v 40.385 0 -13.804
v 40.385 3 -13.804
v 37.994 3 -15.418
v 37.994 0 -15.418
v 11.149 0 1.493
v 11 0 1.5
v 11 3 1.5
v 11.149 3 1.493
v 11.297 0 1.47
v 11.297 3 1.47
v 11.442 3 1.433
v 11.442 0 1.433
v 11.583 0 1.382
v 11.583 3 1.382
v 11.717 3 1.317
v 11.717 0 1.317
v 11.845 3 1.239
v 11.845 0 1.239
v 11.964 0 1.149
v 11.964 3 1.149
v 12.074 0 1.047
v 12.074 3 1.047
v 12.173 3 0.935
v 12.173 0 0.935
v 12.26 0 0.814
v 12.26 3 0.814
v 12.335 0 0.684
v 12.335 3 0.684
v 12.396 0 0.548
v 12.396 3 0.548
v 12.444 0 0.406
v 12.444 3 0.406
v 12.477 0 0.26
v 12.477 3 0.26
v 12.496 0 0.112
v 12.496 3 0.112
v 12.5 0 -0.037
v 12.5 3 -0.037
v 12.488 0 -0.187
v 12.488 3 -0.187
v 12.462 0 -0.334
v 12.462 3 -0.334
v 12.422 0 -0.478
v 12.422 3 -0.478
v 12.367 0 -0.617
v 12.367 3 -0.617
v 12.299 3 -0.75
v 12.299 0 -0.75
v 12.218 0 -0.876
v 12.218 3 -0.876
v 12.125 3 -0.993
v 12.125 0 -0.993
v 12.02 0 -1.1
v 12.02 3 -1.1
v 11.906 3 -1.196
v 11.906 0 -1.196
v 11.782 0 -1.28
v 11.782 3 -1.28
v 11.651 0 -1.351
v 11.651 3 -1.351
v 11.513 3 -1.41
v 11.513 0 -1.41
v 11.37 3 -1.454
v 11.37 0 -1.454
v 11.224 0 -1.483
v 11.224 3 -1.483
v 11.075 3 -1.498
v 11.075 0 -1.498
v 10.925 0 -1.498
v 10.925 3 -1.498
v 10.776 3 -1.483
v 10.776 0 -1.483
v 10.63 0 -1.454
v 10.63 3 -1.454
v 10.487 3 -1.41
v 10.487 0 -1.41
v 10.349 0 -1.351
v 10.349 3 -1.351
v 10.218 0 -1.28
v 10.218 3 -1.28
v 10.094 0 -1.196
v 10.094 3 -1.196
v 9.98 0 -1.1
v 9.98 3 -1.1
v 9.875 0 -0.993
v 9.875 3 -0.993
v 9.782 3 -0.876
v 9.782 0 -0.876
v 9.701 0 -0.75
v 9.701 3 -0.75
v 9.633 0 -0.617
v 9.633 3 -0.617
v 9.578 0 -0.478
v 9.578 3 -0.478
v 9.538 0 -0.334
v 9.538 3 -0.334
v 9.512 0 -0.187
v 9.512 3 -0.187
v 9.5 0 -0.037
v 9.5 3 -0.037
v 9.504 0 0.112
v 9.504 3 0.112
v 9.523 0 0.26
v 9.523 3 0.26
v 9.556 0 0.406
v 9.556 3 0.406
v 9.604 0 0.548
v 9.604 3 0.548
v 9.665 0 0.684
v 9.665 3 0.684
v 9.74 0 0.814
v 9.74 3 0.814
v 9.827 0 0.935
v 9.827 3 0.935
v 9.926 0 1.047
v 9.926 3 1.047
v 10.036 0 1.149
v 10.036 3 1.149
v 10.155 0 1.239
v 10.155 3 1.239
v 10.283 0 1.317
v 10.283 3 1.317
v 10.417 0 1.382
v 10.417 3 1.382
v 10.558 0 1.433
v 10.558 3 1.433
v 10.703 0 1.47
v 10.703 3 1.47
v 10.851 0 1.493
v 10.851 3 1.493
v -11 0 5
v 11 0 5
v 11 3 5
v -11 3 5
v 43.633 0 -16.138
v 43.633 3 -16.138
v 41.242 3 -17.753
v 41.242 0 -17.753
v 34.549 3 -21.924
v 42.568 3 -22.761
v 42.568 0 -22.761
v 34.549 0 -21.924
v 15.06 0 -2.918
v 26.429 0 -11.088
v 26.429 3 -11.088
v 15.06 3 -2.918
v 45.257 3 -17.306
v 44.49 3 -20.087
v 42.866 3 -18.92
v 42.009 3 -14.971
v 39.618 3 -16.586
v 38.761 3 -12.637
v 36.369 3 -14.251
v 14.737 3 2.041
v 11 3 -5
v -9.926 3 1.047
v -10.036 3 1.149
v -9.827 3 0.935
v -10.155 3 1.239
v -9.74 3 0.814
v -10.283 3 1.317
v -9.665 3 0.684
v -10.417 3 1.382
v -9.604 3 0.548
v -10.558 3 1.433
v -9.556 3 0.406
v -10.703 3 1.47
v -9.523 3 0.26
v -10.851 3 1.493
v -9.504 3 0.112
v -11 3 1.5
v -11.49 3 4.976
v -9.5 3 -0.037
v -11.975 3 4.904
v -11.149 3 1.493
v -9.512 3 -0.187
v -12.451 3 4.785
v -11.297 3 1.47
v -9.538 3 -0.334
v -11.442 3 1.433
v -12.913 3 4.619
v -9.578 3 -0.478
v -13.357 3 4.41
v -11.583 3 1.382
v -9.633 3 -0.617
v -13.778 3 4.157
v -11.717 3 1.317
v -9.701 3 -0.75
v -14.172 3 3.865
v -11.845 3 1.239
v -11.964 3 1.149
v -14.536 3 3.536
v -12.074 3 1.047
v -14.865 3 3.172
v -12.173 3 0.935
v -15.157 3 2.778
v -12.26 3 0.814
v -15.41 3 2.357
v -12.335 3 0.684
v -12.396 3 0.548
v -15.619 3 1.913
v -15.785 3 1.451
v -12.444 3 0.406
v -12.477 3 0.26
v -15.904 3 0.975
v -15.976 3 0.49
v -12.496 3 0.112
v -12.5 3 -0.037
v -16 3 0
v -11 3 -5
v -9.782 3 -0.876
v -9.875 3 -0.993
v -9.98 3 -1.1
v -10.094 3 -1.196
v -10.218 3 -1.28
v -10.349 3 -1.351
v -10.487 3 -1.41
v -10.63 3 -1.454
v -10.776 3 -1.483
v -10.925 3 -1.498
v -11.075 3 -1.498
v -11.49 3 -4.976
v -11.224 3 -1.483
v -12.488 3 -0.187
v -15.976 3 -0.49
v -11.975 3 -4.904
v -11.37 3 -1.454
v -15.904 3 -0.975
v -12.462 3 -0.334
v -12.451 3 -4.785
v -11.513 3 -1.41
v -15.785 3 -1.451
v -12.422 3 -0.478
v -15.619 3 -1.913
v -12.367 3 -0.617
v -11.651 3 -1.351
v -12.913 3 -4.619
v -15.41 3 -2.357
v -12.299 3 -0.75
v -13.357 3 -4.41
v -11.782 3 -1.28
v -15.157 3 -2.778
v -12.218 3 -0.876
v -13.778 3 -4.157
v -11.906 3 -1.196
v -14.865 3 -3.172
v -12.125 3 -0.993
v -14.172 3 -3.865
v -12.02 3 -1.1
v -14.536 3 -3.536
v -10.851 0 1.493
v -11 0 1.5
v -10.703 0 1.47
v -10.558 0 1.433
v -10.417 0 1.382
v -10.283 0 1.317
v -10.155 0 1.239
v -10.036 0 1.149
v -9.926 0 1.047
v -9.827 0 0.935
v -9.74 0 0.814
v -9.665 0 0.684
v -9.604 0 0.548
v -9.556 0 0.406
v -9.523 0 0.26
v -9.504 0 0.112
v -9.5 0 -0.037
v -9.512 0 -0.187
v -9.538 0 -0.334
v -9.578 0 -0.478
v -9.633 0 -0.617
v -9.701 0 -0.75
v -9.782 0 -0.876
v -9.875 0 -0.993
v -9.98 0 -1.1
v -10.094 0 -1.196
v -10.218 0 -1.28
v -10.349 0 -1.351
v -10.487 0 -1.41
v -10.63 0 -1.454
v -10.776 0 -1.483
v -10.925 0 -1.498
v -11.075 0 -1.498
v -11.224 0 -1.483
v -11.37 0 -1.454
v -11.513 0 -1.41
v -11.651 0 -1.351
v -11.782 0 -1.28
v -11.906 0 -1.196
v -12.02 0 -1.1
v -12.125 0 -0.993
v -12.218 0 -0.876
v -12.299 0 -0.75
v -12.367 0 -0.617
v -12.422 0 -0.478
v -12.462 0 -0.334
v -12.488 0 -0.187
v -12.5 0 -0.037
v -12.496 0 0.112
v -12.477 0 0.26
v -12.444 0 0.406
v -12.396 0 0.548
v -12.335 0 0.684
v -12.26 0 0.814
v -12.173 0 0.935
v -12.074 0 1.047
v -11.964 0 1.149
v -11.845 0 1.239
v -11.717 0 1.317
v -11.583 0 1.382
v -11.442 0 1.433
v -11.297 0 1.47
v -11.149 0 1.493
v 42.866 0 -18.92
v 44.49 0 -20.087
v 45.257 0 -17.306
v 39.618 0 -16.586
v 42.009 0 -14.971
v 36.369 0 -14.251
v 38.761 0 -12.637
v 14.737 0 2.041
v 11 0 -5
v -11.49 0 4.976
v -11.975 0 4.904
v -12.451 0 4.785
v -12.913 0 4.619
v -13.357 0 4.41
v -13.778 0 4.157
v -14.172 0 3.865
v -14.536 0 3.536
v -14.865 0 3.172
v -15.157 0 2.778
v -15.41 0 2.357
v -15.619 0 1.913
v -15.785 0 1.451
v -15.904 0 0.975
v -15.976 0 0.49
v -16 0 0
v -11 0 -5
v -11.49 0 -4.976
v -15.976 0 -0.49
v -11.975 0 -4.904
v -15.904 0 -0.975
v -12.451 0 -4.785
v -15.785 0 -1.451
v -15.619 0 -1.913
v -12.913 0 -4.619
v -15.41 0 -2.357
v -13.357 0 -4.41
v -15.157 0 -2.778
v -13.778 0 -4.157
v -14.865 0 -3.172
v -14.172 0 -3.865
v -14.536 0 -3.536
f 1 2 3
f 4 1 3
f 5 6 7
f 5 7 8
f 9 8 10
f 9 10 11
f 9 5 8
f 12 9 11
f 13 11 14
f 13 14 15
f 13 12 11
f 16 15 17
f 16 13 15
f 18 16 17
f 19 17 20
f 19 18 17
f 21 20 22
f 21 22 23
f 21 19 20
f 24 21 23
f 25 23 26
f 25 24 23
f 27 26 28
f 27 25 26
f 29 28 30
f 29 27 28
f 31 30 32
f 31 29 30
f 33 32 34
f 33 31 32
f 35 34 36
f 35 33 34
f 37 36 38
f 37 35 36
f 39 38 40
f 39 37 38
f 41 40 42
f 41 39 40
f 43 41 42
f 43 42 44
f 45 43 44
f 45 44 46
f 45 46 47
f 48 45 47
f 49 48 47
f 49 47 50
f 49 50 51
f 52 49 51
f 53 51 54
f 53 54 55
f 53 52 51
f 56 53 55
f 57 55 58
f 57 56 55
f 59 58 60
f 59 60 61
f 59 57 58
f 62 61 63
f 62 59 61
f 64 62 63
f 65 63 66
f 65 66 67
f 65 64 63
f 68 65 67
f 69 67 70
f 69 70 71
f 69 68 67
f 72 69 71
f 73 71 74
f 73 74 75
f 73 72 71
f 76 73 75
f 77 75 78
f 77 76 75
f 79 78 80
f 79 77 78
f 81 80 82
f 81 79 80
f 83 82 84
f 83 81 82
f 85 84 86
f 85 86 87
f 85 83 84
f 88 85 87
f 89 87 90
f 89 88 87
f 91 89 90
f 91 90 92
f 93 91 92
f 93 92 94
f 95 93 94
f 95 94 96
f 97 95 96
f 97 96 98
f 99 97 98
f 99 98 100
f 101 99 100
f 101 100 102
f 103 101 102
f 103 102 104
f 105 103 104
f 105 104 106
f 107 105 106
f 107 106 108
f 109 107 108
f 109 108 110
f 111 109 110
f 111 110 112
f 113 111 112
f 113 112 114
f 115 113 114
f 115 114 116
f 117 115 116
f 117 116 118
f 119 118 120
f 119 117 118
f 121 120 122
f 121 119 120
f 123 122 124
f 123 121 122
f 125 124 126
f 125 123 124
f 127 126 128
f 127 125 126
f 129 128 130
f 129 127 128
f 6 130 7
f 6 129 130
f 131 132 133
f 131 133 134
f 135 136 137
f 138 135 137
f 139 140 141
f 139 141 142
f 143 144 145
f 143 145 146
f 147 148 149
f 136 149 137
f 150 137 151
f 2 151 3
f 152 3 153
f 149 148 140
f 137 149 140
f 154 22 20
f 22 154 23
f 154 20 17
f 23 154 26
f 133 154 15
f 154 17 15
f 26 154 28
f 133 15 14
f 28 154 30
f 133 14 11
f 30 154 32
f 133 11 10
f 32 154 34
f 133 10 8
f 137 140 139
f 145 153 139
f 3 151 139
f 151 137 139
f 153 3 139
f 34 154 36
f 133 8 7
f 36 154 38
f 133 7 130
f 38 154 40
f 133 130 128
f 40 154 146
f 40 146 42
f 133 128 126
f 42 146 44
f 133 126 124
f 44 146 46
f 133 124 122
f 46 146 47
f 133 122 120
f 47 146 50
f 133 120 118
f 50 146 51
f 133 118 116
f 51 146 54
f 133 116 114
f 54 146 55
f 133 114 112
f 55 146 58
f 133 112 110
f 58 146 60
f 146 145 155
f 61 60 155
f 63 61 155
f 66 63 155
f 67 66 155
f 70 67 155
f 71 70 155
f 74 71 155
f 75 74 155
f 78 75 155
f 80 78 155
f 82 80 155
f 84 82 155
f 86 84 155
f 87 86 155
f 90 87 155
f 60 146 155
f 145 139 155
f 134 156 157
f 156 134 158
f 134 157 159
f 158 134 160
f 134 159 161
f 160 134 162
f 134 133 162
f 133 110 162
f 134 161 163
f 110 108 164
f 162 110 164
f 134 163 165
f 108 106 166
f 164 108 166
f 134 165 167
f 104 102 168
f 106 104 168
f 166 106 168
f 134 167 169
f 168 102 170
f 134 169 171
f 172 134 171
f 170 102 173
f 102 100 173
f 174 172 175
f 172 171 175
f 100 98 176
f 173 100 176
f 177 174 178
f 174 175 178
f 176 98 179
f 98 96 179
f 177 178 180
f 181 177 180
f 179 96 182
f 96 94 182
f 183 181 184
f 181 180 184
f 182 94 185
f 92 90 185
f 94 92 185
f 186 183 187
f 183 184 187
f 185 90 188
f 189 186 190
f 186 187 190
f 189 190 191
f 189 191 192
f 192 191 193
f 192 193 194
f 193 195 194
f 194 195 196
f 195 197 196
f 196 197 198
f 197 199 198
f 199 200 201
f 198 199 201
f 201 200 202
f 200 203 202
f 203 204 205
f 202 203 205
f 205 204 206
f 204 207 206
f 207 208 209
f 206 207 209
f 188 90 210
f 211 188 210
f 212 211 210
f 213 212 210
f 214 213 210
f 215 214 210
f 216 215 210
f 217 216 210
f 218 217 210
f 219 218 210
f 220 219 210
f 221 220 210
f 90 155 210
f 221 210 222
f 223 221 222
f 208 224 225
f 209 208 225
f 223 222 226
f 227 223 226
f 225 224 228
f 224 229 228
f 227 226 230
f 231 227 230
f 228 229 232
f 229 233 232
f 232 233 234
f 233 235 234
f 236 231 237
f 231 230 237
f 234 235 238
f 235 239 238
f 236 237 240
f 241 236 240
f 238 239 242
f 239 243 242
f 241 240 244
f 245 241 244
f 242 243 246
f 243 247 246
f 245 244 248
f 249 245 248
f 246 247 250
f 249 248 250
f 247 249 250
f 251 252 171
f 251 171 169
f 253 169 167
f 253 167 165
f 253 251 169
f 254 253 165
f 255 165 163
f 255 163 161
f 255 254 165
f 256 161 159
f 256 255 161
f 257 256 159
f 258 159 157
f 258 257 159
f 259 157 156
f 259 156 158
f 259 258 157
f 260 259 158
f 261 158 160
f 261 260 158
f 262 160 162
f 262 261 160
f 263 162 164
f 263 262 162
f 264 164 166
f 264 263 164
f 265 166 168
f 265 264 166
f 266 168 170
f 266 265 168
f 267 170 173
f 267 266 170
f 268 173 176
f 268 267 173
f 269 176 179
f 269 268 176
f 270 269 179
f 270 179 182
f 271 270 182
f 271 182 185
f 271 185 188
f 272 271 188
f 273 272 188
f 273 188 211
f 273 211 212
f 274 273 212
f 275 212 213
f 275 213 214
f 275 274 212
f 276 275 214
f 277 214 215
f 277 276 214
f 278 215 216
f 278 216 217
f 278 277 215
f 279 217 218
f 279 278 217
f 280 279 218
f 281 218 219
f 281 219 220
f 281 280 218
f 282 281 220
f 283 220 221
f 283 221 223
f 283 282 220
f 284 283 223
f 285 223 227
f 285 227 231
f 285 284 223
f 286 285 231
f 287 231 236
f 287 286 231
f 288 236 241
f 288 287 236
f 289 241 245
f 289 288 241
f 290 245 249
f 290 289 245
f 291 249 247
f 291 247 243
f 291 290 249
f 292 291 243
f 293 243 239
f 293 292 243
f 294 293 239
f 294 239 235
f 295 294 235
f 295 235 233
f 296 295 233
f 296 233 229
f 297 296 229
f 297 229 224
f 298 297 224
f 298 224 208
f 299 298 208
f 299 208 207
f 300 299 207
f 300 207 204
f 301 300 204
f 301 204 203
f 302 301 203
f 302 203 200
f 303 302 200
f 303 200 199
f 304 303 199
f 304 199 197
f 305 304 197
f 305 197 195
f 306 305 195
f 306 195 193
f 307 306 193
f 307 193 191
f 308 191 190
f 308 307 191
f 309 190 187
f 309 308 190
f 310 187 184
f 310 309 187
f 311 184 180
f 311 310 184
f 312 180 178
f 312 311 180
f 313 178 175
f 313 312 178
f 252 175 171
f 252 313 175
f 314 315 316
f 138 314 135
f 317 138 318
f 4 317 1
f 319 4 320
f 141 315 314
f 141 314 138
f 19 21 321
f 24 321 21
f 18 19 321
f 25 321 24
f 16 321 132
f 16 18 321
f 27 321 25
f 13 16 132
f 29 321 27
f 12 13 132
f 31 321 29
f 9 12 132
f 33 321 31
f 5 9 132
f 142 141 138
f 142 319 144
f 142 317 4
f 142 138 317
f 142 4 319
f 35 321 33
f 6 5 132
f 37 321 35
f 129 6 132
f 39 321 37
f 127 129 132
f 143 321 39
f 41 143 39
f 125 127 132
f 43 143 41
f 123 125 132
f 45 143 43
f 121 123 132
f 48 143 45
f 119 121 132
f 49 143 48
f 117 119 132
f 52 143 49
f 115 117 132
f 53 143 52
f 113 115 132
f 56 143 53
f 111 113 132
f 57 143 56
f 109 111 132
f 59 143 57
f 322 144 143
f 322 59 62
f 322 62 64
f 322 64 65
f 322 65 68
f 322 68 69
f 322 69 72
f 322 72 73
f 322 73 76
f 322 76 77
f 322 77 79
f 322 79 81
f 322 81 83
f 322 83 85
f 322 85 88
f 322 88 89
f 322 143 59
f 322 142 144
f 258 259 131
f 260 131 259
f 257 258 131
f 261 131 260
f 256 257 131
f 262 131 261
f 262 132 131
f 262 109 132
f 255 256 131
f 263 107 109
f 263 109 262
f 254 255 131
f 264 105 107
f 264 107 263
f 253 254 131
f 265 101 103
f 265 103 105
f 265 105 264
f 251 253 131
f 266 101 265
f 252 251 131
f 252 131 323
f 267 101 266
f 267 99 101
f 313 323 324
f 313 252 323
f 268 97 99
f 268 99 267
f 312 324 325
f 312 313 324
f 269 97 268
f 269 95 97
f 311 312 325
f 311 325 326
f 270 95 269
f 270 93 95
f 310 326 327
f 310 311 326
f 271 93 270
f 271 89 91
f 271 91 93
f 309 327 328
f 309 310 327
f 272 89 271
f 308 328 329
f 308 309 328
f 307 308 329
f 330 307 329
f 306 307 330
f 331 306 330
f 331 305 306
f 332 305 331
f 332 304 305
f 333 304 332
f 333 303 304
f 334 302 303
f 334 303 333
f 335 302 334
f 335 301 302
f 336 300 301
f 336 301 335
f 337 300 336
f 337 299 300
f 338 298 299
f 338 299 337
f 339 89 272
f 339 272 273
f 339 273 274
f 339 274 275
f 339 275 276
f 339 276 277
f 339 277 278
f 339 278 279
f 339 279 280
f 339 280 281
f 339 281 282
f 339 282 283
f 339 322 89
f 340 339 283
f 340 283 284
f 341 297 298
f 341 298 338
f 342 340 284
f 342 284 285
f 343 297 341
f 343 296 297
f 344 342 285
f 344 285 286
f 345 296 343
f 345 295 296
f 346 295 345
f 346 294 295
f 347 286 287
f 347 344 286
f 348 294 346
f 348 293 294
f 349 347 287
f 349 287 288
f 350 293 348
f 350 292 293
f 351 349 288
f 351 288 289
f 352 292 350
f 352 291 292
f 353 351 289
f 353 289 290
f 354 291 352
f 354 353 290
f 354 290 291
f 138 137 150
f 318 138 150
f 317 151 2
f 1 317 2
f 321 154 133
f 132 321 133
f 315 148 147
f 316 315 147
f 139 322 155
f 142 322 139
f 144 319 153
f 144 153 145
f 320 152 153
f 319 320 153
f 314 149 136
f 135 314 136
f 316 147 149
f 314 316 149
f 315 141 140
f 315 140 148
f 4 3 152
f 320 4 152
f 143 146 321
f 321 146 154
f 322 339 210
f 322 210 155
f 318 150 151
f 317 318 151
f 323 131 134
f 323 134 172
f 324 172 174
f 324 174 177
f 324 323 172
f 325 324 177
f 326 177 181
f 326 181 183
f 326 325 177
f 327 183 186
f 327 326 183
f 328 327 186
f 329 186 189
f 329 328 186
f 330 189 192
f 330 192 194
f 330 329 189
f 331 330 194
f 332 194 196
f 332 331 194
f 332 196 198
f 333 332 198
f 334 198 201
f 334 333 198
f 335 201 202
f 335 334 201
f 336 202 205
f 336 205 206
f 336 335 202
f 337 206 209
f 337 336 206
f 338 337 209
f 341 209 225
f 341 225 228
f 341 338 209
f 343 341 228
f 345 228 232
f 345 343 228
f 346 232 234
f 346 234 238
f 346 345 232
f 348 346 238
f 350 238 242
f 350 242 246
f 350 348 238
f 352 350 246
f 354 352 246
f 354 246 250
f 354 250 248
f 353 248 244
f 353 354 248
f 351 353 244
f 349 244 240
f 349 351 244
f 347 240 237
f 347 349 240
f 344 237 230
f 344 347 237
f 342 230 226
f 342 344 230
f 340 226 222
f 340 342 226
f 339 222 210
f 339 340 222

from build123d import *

# Parameters (mm, degrees)
IZIM2_R                     = 1.5
Y_KSEKLIK_EKSTR_ZYON1_DEPTH = 3
Y_KSEKLIK_EKSTR_ZYON2_START = -3
Y_KSEKLIK_EKSTR_ZYON2_DEPTH = 3
KES_EKSTR_ZYON1_DEPTH       = 3
KES_EKSTR_ZYON2_DEPTH       = 3
KES_EKSTR_ZYON3_DEPTH       = 3


with BuildPart() as part:
    # Çizim2 → Yükseklik-Ekstrüzyon1 (new body)
    with BuildSketch(Plane(origin=(0, 0, 0), x_dir=(1, 0, 0), z_dir=(0, 1, 0))):
        with BuildLine():
            Line((-11, 5), (11, 5))
            ThreePointArc((11, 5), (16, 0), (11, -5))
            Line((11, -5), (-11, -5))
            ThreePointArc((-11, -5), (-16, 0), (-11, 5))
        make_face()
        with Locations(Location((-11, 0, 0), (0, 0, 270))):
            Circle(IZIM2_R, mode=Mode.SUBTRACT)
        with Locations(Location((11, 0, 0), (0, 0, 270))):
            Circle(IZIM2_R, mode=Mode.SUBTRACT)
    extrude(amount=Y_KSEKLIK_EKSTR_ZYON1_DEPTH)

    # Çizim3 → Yükseklik-Ekstrüzyon2 (add)
    with BuildSketch(Plane(origin=(0, 3, 0), x_dir=(1, 0, 0), z_dir=(0, 1, 0)).offset(Y_KSEKLIK_EKSTR_ZYON2_START)):
        with BuildLine():
            Line((11, 5), (40.233453571, 26.009645221))
            Line((40.233453571, 26.009645221), (46.069466132, 17.889241451))
            Line((46.069466132, 17.889241451), (37.949062363, 12.05322889))
            Line((37.949062363, 12.05322889), (36.369445688, 14.251155139))
            Line((36.369445688, 14.251155139), (26.428767162, 11.088423867))
            Line((26.428767162, 11.088423867), (15.060201885, 2.918006281))
            ThreePointArc((15.060201885, 2.918006281), (13.281443468, 4.449158988), (11, 5))
        make_face()
    extrude(amount=Y_KSEKLIK_EKSTR_ZYON2_DEPTH)

    # Çizim4 → Kes-Ekstrüzyon1 (cut)
    with BuildSketch(Plane(origin=(0, 3, 0), x_dir=(1, 0, 0), z_dir=(0, 1, 0))):
        Polygon((34.549170932, 21.924436428), (40.233453571, 26.009645221), (42.567858595, 22.761483713), align=None)
    extrude(amount=-KES_EKSTR_ZYON1_DEPTH, mode=Mode.SUBTRACT)

    # Çizim5 → Kes-Ekstrüzyon2 (cut)
    with BuildSketch(Plane(origin=(0, 3, 0), x_dir=(1, 0, 0), z_dir=(0, 1, 0))):
        Polygon((38.76110274, 12.636830146), (36.369445688, 14.251155139), (37.949062363, 12.05322889), align=None)
        Polygon((37.993526442, 15.418357651), (38.76110274, 12.636830146), (40.385183494, 13.804032658), align=None)
        Polygon((39.617607196, 16.585560164), (40.385183494, 13.804032658), (42.009264247, 14.971235171), align=None)
        Polygon((41.24168795, 17.752762676), (42.009264247, 14.971235171), (43.633345001, 16.138437683), align=None)
        Polygon((42.865768704, 18.919965188), (43.633345001, 16.138437683), (45.257425755, 17.305640195), align=None)
        Polygon((44.489849458, 20.0871677), (45.257425755, 17.305640195), (46.069466132, 17.889241451), align=None)
    extrude(amount=-KES_EKSTR_ZYON2_DEPTH, mode=Mode.SUBTRACT)

    # Çizim6 → Kes-Ekstrüzyon3 (cut)
    with BuildSketch(Plane(origin=(0, 3, 0), x_dir=(1, 0, 0), z_dir=(0, 1, 0))):
        Polygon((15.060201885, 2.918006281), (14.736771564, -2.041177089), (11, -5), (11, -9.807776343), (27.690155634, -9.807776343), (28.885017057, 0.673945989), align=None)
    extrude(amount=-KES_EKSTR_ZYON3_DEPTH, mode=Mode.SUBTRACT)


solid = part.part
